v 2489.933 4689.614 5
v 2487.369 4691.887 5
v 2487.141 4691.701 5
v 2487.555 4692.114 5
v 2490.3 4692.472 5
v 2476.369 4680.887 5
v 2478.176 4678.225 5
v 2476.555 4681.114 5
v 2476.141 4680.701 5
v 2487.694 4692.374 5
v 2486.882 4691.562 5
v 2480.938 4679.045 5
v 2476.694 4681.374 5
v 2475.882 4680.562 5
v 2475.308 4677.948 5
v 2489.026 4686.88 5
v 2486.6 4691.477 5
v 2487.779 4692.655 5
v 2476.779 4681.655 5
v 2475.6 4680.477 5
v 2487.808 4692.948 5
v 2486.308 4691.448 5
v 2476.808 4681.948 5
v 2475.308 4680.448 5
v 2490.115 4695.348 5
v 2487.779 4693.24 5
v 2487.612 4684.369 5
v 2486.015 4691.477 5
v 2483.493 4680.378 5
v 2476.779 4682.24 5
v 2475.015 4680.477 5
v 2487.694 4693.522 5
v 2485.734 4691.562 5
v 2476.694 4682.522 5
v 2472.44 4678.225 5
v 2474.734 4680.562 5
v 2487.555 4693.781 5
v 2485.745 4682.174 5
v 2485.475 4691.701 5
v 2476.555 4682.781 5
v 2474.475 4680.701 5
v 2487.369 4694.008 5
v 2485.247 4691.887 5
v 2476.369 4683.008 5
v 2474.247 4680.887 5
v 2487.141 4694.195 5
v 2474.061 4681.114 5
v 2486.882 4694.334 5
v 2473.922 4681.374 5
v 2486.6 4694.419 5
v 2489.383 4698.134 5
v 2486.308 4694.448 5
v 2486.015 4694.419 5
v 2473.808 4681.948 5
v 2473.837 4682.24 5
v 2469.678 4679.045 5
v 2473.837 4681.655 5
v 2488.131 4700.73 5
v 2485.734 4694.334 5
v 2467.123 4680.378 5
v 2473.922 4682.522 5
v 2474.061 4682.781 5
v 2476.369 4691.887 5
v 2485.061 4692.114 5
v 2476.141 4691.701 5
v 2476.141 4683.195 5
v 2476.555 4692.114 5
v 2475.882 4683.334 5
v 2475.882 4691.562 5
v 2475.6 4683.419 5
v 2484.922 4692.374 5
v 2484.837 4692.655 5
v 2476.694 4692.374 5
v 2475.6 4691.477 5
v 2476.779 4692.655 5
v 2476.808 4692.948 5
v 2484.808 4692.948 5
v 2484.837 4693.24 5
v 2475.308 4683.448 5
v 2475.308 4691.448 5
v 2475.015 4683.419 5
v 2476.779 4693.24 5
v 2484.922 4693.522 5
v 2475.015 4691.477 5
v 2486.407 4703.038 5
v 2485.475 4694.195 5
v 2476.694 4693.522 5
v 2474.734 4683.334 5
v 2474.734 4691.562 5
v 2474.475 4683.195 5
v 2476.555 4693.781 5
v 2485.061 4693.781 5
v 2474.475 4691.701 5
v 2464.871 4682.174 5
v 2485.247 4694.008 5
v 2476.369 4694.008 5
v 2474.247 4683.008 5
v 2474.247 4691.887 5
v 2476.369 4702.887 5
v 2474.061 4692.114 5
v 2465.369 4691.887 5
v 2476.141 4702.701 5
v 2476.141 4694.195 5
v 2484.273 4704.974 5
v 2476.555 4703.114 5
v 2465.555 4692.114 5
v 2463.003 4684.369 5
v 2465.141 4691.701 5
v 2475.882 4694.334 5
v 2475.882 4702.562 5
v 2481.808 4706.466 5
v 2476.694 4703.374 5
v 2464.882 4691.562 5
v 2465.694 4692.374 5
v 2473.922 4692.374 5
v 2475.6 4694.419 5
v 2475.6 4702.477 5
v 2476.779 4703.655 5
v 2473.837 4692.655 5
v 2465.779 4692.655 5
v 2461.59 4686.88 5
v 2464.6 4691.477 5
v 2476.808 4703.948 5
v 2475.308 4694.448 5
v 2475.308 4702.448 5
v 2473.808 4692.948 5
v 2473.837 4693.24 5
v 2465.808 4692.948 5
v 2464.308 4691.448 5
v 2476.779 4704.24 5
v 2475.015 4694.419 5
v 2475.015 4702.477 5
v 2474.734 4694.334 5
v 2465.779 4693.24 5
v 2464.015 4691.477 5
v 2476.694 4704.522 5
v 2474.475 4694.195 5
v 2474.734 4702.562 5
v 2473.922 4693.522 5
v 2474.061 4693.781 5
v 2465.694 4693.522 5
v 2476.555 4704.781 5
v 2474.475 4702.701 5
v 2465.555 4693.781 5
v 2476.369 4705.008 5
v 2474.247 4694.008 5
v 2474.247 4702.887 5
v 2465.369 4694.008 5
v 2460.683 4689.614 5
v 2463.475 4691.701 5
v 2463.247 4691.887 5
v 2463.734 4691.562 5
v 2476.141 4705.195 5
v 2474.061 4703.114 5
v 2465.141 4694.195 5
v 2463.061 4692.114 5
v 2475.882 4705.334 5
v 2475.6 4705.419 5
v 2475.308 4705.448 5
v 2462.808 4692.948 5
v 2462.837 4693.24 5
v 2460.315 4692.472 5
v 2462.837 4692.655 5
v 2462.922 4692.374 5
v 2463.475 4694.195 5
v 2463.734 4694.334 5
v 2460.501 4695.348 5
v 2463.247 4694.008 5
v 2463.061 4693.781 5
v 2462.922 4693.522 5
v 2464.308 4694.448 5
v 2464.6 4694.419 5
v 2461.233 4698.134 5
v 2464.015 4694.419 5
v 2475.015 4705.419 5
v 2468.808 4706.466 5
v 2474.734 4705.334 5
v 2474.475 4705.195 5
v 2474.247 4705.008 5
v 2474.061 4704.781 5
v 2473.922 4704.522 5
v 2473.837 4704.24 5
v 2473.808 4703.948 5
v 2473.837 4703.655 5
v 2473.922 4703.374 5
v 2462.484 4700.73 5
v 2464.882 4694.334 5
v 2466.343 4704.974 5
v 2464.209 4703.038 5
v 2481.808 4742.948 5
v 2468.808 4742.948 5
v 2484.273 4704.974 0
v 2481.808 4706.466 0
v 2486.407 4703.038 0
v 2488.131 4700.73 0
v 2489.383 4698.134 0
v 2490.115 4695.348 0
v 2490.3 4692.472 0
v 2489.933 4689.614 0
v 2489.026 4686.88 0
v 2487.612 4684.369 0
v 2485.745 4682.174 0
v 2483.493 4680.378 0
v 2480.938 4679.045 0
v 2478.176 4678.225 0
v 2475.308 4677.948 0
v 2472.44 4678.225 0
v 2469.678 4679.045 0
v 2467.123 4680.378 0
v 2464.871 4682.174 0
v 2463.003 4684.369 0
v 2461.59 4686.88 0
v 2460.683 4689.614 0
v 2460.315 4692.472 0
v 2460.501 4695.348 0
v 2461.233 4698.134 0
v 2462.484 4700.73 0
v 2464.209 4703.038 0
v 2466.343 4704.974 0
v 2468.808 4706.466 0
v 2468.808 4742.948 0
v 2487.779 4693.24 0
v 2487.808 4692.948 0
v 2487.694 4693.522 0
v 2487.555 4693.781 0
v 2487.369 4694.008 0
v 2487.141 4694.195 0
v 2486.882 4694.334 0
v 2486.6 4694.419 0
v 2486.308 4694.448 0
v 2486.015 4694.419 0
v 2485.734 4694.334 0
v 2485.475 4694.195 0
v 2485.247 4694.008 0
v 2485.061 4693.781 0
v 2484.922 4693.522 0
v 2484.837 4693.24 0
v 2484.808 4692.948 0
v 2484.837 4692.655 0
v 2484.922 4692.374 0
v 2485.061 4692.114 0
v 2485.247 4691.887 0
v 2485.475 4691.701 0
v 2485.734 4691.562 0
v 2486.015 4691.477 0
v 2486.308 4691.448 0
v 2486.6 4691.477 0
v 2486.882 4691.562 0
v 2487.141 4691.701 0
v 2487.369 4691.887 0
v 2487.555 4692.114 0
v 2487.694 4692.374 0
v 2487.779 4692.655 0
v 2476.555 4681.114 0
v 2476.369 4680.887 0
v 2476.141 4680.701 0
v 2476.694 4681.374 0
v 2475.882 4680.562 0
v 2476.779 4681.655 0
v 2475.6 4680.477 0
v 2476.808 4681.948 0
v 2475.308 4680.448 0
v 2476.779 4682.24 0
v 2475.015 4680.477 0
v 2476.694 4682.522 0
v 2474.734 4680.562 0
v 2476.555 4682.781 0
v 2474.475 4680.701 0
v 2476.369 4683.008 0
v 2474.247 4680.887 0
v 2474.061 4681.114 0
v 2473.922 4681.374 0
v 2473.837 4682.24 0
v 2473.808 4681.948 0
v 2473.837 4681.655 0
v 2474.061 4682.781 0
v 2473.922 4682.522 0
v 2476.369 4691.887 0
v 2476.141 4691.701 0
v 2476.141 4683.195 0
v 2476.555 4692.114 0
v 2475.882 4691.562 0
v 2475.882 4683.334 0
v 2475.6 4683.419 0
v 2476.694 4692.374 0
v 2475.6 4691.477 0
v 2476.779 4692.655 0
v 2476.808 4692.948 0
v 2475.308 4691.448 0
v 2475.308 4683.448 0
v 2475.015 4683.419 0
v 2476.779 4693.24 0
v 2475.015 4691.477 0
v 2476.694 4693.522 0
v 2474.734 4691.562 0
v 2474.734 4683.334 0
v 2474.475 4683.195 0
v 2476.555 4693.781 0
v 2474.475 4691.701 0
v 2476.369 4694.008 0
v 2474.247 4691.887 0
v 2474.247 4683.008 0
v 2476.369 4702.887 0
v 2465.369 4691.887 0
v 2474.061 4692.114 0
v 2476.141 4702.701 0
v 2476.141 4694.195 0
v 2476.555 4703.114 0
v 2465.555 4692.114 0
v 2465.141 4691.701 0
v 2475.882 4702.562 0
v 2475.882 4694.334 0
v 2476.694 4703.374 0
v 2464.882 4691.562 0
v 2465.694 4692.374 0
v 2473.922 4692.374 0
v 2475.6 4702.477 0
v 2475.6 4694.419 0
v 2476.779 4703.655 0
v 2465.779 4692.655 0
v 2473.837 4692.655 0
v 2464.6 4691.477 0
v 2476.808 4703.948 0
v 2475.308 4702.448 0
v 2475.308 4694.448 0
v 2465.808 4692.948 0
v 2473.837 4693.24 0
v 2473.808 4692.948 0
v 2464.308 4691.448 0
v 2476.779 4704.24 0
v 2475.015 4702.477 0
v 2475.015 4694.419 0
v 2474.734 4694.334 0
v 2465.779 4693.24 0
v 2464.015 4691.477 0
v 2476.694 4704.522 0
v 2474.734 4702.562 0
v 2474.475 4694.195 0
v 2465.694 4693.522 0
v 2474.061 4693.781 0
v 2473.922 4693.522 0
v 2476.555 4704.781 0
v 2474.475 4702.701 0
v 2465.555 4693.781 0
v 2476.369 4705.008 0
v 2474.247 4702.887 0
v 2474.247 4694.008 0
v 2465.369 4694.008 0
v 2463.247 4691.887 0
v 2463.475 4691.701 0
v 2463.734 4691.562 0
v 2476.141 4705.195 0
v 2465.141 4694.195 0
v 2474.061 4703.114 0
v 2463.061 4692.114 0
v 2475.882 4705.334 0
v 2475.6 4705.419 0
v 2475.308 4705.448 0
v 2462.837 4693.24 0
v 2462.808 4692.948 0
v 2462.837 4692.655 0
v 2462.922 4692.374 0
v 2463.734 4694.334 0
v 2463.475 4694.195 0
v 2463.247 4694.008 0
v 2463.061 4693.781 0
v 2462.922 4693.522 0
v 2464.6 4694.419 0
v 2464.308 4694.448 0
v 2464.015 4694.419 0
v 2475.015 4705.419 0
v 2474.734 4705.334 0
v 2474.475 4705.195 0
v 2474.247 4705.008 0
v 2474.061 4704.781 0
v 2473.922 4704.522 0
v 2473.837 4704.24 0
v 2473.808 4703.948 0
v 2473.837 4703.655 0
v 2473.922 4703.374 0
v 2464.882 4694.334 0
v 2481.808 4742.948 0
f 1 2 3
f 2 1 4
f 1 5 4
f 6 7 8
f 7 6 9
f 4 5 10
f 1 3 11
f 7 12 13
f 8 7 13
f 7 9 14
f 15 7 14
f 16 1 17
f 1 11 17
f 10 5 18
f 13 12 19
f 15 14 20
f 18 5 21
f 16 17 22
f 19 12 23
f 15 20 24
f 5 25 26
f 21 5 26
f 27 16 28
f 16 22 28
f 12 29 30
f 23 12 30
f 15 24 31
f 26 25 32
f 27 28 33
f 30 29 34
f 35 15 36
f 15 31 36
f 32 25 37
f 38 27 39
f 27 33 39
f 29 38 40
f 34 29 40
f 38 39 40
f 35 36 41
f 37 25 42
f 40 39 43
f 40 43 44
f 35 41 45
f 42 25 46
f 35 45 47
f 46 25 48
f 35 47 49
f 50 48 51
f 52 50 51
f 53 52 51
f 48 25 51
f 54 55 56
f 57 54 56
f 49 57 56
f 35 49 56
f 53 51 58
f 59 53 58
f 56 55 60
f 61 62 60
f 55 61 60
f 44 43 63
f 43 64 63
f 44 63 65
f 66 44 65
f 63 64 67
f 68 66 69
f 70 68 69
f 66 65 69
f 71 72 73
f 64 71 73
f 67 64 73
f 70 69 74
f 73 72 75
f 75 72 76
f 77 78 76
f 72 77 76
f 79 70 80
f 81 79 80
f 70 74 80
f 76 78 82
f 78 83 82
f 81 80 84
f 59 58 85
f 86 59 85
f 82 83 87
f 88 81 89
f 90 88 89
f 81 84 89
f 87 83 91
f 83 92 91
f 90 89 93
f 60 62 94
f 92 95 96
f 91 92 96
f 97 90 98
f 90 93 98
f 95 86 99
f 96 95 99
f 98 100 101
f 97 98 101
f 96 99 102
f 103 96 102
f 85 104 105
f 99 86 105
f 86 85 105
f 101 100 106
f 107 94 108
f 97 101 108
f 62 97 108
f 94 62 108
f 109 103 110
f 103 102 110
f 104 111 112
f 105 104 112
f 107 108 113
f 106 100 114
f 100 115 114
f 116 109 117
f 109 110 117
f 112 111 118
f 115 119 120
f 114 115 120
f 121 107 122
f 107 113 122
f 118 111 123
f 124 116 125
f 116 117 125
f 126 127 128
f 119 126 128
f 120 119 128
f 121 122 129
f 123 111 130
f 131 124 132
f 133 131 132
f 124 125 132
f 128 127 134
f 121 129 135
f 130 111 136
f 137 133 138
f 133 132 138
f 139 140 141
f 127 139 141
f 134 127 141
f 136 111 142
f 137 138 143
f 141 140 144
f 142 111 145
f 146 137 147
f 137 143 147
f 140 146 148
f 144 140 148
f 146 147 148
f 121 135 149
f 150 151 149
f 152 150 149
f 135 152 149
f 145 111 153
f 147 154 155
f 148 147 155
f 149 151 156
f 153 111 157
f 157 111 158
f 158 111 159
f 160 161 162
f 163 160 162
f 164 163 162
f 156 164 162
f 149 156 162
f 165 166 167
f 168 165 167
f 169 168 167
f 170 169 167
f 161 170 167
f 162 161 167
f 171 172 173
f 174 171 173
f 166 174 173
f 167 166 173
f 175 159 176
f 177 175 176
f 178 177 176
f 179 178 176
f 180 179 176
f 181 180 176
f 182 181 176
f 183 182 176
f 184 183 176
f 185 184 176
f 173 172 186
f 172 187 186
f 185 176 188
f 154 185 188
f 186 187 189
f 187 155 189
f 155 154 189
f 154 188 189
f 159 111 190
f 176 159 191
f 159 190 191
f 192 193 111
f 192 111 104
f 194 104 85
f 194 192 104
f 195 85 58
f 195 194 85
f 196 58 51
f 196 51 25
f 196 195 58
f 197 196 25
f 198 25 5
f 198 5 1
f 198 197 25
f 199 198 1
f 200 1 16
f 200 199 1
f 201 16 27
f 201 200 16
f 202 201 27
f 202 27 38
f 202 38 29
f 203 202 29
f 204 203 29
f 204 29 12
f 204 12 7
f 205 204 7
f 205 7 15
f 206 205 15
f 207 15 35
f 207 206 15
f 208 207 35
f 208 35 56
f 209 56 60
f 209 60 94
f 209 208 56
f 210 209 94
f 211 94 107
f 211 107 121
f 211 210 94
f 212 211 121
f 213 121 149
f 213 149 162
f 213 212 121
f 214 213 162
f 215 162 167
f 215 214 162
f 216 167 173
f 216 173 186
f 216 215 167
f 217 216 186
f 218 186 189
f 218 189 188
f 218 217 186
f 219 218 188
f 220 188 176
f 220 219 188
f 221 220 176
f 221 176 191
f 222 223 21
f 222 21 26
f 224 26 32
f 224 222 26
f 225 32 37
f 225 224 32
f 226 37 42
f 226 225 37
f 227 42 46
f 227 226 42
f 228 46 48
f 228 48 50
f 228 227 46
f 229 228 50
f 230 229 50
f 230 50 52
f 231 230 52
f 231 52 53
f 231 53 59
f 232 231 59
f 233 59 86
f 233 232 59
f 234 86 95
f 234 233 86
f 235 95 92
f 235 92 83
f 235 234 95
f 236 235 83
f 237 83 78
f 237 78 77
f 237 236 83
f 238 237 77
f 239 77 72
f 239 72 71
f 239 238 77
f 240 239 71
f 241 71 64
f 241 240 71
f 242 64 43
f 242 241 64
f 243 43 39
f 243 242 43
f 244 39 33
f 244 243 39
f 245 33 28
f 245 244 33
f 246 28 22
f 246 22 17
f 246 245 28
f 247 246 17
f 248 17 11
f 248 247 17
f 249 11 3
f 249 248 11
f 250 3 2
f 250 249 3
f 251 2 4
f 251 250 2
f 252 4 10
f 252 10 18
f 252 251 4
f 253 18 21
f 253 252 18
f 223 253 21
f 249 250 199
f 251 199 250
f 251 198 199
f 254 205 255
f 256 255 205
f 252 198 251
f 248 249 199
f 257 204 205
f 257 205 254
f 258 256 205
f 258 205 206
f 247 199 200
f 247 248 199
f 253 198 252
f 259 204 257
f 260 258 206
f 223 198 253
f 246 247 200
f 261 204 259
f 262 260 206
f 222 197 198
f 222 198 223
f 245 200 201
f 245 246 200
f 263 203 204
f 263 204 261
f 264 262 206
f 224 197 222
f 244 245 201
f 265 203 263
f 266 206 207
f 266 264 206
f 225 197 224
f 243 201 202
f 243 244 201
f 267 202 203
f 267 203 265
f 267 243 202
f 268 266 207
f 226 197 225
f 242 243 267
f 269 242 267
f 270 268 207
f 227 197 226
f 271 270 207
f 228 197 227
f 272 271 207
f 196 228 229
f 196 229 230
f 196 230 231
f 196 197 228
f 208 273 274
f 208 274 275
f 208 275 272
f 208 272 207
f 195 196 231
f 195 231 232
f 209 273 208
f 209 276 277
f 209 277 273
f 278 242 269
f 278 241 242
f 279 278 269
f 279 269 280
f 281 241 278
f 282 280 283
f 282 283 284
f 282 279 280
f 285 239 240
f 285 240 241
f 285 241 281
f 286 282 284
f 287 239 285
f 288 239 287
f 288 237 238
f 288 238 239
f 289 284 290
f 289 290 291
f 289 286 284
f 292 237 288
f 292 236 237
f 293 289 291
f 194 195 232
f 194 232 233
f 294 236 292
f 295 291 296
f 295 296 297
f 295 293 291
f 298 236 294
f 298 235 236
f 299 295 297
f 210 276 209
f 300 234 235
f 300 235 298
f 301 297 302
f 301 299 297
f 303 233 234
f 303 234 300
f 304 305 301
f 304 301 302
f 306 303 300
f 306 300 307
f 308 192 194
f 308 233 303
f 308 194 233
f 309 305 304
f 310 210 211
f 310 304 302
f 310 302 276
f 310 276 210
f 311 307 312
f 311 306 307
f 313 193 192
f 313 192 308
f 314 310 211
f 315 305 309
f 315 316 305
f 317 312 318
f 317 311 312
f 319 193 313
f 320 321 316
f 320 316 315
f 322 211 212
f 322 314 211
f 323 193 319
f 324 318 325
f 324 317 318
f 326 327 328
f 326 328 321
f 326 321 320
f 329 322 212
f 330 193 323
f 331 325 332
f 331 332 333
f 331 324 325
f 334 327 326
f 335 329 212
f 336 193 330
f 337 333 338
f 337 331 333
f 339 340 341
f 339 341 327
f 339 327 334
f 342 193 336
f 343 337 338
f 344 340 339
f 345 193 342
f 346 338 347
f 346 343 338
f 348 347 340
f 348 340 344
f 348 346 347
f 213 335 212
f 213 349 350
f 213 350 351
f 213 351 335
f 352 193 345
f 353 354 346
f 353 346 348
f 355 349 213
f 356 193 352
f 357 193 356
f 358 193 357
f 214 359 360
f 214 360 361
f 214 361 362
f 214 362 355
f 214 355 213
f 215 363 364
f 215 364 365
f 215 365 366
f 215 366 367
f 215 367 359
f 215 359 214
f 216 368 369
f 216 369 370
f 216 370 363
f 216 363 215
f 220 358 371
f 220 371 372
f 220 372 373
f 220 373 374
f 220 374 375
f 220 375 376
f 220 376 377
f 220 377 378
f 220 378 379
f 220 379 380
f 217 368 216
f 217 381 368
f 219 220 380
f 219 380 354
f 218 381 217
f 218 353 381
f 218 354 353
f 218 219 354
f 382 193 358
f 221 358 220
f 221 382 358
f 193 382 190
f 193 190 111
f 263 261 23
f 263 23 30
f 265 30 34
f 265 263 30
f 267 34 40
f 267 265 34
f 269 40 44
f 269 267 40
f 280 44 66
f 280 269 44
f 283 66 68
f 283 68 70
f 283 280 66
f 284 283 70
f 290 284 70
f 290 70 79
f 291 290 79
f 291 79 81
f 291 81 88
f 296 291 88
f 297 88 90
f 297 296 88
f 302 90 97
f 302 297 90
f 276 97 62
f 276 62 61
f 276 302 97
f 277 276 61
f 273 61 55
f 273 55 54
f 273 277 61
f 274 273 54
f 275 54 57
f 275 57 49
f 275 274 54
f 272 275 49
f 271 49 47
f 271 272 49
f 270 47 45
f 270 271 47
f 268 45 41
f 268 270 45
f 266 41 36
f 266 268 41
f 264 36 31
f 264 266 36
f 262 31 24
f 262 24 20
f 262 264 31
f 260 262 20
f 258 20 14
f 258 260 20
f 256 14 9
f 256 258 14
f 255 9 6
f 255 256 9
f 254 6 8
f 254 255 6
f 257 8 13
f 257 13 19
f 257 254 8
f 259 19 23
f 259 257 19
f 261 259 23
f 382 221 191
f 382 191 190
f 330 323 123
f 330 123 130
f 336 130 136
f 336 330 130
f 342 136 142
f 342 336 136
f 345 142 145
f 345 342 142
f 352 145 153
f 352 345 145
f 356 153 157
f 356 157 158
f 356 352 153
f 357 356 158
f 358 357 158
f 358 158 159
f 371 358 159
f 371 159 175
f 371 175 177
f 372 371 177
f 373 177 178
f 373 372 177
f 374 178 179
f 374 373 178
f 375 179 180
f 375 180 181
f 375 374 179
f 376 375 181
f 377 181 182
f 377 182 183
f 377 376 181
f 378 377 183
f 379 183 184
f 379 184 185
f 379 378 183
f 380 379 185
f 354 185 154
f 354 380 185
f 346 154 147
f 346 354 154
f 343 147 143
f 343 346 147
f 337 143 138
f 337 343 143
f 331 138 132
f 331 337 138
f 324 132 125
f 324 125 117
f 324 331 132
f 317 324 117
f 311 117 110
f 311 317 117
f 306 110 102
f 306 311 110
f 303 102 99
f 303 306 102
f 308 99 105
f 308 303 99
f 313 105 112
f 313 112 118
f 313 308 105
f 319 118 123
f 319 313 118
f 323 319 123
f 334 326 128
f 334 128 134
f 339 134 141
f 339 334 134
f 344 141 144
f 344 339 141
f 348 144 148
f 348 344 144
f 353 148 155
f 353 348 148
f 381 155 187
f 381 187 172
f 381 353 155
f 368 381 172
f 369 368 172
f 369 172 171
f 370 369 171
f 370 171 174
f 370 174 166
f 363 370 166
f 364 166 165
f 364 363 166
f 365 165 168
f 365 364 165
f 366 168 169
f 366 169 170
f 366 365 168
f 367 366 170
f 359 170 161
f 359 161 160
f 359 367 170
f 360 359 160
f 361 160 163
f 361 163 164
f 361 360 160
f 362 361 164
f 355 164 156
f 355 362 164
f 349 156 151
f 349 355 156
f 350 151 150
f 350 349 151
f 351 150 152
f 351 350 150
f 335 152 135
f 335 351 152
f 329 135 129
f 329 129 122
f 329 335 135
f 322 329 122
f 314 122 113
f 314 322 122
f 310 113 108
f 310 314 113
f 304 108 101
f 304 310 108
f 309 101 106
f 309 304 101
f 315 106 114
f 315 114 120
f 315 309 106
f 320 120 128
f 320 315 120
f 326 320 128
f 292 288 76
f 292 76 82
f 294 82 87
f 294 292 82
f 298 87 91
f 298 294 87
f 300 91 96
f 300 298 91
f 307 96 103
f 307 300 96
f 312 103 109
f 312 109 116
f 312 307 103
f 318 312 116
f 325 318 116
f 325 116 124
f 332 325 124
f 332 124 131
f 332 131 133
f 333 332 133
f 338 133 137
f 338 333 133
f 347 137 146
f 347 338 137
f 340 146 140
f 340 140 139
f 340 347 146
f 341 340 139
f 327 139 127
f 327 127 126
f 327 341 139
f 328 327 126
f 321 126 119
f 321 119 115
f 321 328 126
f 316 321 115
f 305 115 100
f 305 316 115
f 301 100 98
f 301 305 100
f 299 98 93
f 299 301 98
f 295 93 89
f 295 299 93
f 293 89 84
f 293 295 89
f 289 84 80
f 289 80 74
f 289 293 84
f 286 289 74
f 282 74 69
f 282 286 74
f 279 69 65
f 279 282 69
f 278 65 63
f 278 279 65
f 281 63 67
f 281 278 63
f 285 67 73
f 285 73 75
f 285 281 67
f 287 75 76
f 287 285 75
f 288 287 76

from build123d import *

# Parameters (mm, degrees)
SKETCH_1_R      = 1.5
EXTRUDE_1_DEPTH = 5


with BuildPart() as part:
    # 草图1 → 凸台-拉伸1 (new body)
    with BuildSketch(Plane.XY):
        with BuildLine():
            Line((2468.807860146, 4706.466341516), (2468.807860146, 4742.947835682))
            Line((2468.807860146, 4742.947835682), (2481.807860146, 4742.947835682))
            Line((2481.807860146, 4742.947835682), (2481.807860146, 4706.466341516))
            ThreePointArc((2481.807860146, 4706.466341516), (2475.307860146, 4677.947835682), (2468.807860146, 4706.466341516))
        make_face()
        with Locations((2475.307860146, 4692.947835682)):
            Circle(SKETCH_1_R, mode=Mode.SUBTRACT)
        with Locations((2464.307860146, 4692.947835682)):
            Circle(SKETCH_1_R, mode=Mode.SUBTRACT)
        with Locations((2486.307860146, 4692.947835682)):
            Circle(SKETCH_1_R, mode=Mode.SUBTRACT)
        with Locations((2475.307860146, 4703.947835682)):
            Circle(SKETCH_1_R, mode=Mode.SUBTRACT)
        with Locations((2475.307860146, 4681.947835682)):
            Circle(SKETCH_1_R, mode=Mode.SUBTRACT)
    extrude(amount=EXTRUDE_1_DEPTH)


solid = part.part
